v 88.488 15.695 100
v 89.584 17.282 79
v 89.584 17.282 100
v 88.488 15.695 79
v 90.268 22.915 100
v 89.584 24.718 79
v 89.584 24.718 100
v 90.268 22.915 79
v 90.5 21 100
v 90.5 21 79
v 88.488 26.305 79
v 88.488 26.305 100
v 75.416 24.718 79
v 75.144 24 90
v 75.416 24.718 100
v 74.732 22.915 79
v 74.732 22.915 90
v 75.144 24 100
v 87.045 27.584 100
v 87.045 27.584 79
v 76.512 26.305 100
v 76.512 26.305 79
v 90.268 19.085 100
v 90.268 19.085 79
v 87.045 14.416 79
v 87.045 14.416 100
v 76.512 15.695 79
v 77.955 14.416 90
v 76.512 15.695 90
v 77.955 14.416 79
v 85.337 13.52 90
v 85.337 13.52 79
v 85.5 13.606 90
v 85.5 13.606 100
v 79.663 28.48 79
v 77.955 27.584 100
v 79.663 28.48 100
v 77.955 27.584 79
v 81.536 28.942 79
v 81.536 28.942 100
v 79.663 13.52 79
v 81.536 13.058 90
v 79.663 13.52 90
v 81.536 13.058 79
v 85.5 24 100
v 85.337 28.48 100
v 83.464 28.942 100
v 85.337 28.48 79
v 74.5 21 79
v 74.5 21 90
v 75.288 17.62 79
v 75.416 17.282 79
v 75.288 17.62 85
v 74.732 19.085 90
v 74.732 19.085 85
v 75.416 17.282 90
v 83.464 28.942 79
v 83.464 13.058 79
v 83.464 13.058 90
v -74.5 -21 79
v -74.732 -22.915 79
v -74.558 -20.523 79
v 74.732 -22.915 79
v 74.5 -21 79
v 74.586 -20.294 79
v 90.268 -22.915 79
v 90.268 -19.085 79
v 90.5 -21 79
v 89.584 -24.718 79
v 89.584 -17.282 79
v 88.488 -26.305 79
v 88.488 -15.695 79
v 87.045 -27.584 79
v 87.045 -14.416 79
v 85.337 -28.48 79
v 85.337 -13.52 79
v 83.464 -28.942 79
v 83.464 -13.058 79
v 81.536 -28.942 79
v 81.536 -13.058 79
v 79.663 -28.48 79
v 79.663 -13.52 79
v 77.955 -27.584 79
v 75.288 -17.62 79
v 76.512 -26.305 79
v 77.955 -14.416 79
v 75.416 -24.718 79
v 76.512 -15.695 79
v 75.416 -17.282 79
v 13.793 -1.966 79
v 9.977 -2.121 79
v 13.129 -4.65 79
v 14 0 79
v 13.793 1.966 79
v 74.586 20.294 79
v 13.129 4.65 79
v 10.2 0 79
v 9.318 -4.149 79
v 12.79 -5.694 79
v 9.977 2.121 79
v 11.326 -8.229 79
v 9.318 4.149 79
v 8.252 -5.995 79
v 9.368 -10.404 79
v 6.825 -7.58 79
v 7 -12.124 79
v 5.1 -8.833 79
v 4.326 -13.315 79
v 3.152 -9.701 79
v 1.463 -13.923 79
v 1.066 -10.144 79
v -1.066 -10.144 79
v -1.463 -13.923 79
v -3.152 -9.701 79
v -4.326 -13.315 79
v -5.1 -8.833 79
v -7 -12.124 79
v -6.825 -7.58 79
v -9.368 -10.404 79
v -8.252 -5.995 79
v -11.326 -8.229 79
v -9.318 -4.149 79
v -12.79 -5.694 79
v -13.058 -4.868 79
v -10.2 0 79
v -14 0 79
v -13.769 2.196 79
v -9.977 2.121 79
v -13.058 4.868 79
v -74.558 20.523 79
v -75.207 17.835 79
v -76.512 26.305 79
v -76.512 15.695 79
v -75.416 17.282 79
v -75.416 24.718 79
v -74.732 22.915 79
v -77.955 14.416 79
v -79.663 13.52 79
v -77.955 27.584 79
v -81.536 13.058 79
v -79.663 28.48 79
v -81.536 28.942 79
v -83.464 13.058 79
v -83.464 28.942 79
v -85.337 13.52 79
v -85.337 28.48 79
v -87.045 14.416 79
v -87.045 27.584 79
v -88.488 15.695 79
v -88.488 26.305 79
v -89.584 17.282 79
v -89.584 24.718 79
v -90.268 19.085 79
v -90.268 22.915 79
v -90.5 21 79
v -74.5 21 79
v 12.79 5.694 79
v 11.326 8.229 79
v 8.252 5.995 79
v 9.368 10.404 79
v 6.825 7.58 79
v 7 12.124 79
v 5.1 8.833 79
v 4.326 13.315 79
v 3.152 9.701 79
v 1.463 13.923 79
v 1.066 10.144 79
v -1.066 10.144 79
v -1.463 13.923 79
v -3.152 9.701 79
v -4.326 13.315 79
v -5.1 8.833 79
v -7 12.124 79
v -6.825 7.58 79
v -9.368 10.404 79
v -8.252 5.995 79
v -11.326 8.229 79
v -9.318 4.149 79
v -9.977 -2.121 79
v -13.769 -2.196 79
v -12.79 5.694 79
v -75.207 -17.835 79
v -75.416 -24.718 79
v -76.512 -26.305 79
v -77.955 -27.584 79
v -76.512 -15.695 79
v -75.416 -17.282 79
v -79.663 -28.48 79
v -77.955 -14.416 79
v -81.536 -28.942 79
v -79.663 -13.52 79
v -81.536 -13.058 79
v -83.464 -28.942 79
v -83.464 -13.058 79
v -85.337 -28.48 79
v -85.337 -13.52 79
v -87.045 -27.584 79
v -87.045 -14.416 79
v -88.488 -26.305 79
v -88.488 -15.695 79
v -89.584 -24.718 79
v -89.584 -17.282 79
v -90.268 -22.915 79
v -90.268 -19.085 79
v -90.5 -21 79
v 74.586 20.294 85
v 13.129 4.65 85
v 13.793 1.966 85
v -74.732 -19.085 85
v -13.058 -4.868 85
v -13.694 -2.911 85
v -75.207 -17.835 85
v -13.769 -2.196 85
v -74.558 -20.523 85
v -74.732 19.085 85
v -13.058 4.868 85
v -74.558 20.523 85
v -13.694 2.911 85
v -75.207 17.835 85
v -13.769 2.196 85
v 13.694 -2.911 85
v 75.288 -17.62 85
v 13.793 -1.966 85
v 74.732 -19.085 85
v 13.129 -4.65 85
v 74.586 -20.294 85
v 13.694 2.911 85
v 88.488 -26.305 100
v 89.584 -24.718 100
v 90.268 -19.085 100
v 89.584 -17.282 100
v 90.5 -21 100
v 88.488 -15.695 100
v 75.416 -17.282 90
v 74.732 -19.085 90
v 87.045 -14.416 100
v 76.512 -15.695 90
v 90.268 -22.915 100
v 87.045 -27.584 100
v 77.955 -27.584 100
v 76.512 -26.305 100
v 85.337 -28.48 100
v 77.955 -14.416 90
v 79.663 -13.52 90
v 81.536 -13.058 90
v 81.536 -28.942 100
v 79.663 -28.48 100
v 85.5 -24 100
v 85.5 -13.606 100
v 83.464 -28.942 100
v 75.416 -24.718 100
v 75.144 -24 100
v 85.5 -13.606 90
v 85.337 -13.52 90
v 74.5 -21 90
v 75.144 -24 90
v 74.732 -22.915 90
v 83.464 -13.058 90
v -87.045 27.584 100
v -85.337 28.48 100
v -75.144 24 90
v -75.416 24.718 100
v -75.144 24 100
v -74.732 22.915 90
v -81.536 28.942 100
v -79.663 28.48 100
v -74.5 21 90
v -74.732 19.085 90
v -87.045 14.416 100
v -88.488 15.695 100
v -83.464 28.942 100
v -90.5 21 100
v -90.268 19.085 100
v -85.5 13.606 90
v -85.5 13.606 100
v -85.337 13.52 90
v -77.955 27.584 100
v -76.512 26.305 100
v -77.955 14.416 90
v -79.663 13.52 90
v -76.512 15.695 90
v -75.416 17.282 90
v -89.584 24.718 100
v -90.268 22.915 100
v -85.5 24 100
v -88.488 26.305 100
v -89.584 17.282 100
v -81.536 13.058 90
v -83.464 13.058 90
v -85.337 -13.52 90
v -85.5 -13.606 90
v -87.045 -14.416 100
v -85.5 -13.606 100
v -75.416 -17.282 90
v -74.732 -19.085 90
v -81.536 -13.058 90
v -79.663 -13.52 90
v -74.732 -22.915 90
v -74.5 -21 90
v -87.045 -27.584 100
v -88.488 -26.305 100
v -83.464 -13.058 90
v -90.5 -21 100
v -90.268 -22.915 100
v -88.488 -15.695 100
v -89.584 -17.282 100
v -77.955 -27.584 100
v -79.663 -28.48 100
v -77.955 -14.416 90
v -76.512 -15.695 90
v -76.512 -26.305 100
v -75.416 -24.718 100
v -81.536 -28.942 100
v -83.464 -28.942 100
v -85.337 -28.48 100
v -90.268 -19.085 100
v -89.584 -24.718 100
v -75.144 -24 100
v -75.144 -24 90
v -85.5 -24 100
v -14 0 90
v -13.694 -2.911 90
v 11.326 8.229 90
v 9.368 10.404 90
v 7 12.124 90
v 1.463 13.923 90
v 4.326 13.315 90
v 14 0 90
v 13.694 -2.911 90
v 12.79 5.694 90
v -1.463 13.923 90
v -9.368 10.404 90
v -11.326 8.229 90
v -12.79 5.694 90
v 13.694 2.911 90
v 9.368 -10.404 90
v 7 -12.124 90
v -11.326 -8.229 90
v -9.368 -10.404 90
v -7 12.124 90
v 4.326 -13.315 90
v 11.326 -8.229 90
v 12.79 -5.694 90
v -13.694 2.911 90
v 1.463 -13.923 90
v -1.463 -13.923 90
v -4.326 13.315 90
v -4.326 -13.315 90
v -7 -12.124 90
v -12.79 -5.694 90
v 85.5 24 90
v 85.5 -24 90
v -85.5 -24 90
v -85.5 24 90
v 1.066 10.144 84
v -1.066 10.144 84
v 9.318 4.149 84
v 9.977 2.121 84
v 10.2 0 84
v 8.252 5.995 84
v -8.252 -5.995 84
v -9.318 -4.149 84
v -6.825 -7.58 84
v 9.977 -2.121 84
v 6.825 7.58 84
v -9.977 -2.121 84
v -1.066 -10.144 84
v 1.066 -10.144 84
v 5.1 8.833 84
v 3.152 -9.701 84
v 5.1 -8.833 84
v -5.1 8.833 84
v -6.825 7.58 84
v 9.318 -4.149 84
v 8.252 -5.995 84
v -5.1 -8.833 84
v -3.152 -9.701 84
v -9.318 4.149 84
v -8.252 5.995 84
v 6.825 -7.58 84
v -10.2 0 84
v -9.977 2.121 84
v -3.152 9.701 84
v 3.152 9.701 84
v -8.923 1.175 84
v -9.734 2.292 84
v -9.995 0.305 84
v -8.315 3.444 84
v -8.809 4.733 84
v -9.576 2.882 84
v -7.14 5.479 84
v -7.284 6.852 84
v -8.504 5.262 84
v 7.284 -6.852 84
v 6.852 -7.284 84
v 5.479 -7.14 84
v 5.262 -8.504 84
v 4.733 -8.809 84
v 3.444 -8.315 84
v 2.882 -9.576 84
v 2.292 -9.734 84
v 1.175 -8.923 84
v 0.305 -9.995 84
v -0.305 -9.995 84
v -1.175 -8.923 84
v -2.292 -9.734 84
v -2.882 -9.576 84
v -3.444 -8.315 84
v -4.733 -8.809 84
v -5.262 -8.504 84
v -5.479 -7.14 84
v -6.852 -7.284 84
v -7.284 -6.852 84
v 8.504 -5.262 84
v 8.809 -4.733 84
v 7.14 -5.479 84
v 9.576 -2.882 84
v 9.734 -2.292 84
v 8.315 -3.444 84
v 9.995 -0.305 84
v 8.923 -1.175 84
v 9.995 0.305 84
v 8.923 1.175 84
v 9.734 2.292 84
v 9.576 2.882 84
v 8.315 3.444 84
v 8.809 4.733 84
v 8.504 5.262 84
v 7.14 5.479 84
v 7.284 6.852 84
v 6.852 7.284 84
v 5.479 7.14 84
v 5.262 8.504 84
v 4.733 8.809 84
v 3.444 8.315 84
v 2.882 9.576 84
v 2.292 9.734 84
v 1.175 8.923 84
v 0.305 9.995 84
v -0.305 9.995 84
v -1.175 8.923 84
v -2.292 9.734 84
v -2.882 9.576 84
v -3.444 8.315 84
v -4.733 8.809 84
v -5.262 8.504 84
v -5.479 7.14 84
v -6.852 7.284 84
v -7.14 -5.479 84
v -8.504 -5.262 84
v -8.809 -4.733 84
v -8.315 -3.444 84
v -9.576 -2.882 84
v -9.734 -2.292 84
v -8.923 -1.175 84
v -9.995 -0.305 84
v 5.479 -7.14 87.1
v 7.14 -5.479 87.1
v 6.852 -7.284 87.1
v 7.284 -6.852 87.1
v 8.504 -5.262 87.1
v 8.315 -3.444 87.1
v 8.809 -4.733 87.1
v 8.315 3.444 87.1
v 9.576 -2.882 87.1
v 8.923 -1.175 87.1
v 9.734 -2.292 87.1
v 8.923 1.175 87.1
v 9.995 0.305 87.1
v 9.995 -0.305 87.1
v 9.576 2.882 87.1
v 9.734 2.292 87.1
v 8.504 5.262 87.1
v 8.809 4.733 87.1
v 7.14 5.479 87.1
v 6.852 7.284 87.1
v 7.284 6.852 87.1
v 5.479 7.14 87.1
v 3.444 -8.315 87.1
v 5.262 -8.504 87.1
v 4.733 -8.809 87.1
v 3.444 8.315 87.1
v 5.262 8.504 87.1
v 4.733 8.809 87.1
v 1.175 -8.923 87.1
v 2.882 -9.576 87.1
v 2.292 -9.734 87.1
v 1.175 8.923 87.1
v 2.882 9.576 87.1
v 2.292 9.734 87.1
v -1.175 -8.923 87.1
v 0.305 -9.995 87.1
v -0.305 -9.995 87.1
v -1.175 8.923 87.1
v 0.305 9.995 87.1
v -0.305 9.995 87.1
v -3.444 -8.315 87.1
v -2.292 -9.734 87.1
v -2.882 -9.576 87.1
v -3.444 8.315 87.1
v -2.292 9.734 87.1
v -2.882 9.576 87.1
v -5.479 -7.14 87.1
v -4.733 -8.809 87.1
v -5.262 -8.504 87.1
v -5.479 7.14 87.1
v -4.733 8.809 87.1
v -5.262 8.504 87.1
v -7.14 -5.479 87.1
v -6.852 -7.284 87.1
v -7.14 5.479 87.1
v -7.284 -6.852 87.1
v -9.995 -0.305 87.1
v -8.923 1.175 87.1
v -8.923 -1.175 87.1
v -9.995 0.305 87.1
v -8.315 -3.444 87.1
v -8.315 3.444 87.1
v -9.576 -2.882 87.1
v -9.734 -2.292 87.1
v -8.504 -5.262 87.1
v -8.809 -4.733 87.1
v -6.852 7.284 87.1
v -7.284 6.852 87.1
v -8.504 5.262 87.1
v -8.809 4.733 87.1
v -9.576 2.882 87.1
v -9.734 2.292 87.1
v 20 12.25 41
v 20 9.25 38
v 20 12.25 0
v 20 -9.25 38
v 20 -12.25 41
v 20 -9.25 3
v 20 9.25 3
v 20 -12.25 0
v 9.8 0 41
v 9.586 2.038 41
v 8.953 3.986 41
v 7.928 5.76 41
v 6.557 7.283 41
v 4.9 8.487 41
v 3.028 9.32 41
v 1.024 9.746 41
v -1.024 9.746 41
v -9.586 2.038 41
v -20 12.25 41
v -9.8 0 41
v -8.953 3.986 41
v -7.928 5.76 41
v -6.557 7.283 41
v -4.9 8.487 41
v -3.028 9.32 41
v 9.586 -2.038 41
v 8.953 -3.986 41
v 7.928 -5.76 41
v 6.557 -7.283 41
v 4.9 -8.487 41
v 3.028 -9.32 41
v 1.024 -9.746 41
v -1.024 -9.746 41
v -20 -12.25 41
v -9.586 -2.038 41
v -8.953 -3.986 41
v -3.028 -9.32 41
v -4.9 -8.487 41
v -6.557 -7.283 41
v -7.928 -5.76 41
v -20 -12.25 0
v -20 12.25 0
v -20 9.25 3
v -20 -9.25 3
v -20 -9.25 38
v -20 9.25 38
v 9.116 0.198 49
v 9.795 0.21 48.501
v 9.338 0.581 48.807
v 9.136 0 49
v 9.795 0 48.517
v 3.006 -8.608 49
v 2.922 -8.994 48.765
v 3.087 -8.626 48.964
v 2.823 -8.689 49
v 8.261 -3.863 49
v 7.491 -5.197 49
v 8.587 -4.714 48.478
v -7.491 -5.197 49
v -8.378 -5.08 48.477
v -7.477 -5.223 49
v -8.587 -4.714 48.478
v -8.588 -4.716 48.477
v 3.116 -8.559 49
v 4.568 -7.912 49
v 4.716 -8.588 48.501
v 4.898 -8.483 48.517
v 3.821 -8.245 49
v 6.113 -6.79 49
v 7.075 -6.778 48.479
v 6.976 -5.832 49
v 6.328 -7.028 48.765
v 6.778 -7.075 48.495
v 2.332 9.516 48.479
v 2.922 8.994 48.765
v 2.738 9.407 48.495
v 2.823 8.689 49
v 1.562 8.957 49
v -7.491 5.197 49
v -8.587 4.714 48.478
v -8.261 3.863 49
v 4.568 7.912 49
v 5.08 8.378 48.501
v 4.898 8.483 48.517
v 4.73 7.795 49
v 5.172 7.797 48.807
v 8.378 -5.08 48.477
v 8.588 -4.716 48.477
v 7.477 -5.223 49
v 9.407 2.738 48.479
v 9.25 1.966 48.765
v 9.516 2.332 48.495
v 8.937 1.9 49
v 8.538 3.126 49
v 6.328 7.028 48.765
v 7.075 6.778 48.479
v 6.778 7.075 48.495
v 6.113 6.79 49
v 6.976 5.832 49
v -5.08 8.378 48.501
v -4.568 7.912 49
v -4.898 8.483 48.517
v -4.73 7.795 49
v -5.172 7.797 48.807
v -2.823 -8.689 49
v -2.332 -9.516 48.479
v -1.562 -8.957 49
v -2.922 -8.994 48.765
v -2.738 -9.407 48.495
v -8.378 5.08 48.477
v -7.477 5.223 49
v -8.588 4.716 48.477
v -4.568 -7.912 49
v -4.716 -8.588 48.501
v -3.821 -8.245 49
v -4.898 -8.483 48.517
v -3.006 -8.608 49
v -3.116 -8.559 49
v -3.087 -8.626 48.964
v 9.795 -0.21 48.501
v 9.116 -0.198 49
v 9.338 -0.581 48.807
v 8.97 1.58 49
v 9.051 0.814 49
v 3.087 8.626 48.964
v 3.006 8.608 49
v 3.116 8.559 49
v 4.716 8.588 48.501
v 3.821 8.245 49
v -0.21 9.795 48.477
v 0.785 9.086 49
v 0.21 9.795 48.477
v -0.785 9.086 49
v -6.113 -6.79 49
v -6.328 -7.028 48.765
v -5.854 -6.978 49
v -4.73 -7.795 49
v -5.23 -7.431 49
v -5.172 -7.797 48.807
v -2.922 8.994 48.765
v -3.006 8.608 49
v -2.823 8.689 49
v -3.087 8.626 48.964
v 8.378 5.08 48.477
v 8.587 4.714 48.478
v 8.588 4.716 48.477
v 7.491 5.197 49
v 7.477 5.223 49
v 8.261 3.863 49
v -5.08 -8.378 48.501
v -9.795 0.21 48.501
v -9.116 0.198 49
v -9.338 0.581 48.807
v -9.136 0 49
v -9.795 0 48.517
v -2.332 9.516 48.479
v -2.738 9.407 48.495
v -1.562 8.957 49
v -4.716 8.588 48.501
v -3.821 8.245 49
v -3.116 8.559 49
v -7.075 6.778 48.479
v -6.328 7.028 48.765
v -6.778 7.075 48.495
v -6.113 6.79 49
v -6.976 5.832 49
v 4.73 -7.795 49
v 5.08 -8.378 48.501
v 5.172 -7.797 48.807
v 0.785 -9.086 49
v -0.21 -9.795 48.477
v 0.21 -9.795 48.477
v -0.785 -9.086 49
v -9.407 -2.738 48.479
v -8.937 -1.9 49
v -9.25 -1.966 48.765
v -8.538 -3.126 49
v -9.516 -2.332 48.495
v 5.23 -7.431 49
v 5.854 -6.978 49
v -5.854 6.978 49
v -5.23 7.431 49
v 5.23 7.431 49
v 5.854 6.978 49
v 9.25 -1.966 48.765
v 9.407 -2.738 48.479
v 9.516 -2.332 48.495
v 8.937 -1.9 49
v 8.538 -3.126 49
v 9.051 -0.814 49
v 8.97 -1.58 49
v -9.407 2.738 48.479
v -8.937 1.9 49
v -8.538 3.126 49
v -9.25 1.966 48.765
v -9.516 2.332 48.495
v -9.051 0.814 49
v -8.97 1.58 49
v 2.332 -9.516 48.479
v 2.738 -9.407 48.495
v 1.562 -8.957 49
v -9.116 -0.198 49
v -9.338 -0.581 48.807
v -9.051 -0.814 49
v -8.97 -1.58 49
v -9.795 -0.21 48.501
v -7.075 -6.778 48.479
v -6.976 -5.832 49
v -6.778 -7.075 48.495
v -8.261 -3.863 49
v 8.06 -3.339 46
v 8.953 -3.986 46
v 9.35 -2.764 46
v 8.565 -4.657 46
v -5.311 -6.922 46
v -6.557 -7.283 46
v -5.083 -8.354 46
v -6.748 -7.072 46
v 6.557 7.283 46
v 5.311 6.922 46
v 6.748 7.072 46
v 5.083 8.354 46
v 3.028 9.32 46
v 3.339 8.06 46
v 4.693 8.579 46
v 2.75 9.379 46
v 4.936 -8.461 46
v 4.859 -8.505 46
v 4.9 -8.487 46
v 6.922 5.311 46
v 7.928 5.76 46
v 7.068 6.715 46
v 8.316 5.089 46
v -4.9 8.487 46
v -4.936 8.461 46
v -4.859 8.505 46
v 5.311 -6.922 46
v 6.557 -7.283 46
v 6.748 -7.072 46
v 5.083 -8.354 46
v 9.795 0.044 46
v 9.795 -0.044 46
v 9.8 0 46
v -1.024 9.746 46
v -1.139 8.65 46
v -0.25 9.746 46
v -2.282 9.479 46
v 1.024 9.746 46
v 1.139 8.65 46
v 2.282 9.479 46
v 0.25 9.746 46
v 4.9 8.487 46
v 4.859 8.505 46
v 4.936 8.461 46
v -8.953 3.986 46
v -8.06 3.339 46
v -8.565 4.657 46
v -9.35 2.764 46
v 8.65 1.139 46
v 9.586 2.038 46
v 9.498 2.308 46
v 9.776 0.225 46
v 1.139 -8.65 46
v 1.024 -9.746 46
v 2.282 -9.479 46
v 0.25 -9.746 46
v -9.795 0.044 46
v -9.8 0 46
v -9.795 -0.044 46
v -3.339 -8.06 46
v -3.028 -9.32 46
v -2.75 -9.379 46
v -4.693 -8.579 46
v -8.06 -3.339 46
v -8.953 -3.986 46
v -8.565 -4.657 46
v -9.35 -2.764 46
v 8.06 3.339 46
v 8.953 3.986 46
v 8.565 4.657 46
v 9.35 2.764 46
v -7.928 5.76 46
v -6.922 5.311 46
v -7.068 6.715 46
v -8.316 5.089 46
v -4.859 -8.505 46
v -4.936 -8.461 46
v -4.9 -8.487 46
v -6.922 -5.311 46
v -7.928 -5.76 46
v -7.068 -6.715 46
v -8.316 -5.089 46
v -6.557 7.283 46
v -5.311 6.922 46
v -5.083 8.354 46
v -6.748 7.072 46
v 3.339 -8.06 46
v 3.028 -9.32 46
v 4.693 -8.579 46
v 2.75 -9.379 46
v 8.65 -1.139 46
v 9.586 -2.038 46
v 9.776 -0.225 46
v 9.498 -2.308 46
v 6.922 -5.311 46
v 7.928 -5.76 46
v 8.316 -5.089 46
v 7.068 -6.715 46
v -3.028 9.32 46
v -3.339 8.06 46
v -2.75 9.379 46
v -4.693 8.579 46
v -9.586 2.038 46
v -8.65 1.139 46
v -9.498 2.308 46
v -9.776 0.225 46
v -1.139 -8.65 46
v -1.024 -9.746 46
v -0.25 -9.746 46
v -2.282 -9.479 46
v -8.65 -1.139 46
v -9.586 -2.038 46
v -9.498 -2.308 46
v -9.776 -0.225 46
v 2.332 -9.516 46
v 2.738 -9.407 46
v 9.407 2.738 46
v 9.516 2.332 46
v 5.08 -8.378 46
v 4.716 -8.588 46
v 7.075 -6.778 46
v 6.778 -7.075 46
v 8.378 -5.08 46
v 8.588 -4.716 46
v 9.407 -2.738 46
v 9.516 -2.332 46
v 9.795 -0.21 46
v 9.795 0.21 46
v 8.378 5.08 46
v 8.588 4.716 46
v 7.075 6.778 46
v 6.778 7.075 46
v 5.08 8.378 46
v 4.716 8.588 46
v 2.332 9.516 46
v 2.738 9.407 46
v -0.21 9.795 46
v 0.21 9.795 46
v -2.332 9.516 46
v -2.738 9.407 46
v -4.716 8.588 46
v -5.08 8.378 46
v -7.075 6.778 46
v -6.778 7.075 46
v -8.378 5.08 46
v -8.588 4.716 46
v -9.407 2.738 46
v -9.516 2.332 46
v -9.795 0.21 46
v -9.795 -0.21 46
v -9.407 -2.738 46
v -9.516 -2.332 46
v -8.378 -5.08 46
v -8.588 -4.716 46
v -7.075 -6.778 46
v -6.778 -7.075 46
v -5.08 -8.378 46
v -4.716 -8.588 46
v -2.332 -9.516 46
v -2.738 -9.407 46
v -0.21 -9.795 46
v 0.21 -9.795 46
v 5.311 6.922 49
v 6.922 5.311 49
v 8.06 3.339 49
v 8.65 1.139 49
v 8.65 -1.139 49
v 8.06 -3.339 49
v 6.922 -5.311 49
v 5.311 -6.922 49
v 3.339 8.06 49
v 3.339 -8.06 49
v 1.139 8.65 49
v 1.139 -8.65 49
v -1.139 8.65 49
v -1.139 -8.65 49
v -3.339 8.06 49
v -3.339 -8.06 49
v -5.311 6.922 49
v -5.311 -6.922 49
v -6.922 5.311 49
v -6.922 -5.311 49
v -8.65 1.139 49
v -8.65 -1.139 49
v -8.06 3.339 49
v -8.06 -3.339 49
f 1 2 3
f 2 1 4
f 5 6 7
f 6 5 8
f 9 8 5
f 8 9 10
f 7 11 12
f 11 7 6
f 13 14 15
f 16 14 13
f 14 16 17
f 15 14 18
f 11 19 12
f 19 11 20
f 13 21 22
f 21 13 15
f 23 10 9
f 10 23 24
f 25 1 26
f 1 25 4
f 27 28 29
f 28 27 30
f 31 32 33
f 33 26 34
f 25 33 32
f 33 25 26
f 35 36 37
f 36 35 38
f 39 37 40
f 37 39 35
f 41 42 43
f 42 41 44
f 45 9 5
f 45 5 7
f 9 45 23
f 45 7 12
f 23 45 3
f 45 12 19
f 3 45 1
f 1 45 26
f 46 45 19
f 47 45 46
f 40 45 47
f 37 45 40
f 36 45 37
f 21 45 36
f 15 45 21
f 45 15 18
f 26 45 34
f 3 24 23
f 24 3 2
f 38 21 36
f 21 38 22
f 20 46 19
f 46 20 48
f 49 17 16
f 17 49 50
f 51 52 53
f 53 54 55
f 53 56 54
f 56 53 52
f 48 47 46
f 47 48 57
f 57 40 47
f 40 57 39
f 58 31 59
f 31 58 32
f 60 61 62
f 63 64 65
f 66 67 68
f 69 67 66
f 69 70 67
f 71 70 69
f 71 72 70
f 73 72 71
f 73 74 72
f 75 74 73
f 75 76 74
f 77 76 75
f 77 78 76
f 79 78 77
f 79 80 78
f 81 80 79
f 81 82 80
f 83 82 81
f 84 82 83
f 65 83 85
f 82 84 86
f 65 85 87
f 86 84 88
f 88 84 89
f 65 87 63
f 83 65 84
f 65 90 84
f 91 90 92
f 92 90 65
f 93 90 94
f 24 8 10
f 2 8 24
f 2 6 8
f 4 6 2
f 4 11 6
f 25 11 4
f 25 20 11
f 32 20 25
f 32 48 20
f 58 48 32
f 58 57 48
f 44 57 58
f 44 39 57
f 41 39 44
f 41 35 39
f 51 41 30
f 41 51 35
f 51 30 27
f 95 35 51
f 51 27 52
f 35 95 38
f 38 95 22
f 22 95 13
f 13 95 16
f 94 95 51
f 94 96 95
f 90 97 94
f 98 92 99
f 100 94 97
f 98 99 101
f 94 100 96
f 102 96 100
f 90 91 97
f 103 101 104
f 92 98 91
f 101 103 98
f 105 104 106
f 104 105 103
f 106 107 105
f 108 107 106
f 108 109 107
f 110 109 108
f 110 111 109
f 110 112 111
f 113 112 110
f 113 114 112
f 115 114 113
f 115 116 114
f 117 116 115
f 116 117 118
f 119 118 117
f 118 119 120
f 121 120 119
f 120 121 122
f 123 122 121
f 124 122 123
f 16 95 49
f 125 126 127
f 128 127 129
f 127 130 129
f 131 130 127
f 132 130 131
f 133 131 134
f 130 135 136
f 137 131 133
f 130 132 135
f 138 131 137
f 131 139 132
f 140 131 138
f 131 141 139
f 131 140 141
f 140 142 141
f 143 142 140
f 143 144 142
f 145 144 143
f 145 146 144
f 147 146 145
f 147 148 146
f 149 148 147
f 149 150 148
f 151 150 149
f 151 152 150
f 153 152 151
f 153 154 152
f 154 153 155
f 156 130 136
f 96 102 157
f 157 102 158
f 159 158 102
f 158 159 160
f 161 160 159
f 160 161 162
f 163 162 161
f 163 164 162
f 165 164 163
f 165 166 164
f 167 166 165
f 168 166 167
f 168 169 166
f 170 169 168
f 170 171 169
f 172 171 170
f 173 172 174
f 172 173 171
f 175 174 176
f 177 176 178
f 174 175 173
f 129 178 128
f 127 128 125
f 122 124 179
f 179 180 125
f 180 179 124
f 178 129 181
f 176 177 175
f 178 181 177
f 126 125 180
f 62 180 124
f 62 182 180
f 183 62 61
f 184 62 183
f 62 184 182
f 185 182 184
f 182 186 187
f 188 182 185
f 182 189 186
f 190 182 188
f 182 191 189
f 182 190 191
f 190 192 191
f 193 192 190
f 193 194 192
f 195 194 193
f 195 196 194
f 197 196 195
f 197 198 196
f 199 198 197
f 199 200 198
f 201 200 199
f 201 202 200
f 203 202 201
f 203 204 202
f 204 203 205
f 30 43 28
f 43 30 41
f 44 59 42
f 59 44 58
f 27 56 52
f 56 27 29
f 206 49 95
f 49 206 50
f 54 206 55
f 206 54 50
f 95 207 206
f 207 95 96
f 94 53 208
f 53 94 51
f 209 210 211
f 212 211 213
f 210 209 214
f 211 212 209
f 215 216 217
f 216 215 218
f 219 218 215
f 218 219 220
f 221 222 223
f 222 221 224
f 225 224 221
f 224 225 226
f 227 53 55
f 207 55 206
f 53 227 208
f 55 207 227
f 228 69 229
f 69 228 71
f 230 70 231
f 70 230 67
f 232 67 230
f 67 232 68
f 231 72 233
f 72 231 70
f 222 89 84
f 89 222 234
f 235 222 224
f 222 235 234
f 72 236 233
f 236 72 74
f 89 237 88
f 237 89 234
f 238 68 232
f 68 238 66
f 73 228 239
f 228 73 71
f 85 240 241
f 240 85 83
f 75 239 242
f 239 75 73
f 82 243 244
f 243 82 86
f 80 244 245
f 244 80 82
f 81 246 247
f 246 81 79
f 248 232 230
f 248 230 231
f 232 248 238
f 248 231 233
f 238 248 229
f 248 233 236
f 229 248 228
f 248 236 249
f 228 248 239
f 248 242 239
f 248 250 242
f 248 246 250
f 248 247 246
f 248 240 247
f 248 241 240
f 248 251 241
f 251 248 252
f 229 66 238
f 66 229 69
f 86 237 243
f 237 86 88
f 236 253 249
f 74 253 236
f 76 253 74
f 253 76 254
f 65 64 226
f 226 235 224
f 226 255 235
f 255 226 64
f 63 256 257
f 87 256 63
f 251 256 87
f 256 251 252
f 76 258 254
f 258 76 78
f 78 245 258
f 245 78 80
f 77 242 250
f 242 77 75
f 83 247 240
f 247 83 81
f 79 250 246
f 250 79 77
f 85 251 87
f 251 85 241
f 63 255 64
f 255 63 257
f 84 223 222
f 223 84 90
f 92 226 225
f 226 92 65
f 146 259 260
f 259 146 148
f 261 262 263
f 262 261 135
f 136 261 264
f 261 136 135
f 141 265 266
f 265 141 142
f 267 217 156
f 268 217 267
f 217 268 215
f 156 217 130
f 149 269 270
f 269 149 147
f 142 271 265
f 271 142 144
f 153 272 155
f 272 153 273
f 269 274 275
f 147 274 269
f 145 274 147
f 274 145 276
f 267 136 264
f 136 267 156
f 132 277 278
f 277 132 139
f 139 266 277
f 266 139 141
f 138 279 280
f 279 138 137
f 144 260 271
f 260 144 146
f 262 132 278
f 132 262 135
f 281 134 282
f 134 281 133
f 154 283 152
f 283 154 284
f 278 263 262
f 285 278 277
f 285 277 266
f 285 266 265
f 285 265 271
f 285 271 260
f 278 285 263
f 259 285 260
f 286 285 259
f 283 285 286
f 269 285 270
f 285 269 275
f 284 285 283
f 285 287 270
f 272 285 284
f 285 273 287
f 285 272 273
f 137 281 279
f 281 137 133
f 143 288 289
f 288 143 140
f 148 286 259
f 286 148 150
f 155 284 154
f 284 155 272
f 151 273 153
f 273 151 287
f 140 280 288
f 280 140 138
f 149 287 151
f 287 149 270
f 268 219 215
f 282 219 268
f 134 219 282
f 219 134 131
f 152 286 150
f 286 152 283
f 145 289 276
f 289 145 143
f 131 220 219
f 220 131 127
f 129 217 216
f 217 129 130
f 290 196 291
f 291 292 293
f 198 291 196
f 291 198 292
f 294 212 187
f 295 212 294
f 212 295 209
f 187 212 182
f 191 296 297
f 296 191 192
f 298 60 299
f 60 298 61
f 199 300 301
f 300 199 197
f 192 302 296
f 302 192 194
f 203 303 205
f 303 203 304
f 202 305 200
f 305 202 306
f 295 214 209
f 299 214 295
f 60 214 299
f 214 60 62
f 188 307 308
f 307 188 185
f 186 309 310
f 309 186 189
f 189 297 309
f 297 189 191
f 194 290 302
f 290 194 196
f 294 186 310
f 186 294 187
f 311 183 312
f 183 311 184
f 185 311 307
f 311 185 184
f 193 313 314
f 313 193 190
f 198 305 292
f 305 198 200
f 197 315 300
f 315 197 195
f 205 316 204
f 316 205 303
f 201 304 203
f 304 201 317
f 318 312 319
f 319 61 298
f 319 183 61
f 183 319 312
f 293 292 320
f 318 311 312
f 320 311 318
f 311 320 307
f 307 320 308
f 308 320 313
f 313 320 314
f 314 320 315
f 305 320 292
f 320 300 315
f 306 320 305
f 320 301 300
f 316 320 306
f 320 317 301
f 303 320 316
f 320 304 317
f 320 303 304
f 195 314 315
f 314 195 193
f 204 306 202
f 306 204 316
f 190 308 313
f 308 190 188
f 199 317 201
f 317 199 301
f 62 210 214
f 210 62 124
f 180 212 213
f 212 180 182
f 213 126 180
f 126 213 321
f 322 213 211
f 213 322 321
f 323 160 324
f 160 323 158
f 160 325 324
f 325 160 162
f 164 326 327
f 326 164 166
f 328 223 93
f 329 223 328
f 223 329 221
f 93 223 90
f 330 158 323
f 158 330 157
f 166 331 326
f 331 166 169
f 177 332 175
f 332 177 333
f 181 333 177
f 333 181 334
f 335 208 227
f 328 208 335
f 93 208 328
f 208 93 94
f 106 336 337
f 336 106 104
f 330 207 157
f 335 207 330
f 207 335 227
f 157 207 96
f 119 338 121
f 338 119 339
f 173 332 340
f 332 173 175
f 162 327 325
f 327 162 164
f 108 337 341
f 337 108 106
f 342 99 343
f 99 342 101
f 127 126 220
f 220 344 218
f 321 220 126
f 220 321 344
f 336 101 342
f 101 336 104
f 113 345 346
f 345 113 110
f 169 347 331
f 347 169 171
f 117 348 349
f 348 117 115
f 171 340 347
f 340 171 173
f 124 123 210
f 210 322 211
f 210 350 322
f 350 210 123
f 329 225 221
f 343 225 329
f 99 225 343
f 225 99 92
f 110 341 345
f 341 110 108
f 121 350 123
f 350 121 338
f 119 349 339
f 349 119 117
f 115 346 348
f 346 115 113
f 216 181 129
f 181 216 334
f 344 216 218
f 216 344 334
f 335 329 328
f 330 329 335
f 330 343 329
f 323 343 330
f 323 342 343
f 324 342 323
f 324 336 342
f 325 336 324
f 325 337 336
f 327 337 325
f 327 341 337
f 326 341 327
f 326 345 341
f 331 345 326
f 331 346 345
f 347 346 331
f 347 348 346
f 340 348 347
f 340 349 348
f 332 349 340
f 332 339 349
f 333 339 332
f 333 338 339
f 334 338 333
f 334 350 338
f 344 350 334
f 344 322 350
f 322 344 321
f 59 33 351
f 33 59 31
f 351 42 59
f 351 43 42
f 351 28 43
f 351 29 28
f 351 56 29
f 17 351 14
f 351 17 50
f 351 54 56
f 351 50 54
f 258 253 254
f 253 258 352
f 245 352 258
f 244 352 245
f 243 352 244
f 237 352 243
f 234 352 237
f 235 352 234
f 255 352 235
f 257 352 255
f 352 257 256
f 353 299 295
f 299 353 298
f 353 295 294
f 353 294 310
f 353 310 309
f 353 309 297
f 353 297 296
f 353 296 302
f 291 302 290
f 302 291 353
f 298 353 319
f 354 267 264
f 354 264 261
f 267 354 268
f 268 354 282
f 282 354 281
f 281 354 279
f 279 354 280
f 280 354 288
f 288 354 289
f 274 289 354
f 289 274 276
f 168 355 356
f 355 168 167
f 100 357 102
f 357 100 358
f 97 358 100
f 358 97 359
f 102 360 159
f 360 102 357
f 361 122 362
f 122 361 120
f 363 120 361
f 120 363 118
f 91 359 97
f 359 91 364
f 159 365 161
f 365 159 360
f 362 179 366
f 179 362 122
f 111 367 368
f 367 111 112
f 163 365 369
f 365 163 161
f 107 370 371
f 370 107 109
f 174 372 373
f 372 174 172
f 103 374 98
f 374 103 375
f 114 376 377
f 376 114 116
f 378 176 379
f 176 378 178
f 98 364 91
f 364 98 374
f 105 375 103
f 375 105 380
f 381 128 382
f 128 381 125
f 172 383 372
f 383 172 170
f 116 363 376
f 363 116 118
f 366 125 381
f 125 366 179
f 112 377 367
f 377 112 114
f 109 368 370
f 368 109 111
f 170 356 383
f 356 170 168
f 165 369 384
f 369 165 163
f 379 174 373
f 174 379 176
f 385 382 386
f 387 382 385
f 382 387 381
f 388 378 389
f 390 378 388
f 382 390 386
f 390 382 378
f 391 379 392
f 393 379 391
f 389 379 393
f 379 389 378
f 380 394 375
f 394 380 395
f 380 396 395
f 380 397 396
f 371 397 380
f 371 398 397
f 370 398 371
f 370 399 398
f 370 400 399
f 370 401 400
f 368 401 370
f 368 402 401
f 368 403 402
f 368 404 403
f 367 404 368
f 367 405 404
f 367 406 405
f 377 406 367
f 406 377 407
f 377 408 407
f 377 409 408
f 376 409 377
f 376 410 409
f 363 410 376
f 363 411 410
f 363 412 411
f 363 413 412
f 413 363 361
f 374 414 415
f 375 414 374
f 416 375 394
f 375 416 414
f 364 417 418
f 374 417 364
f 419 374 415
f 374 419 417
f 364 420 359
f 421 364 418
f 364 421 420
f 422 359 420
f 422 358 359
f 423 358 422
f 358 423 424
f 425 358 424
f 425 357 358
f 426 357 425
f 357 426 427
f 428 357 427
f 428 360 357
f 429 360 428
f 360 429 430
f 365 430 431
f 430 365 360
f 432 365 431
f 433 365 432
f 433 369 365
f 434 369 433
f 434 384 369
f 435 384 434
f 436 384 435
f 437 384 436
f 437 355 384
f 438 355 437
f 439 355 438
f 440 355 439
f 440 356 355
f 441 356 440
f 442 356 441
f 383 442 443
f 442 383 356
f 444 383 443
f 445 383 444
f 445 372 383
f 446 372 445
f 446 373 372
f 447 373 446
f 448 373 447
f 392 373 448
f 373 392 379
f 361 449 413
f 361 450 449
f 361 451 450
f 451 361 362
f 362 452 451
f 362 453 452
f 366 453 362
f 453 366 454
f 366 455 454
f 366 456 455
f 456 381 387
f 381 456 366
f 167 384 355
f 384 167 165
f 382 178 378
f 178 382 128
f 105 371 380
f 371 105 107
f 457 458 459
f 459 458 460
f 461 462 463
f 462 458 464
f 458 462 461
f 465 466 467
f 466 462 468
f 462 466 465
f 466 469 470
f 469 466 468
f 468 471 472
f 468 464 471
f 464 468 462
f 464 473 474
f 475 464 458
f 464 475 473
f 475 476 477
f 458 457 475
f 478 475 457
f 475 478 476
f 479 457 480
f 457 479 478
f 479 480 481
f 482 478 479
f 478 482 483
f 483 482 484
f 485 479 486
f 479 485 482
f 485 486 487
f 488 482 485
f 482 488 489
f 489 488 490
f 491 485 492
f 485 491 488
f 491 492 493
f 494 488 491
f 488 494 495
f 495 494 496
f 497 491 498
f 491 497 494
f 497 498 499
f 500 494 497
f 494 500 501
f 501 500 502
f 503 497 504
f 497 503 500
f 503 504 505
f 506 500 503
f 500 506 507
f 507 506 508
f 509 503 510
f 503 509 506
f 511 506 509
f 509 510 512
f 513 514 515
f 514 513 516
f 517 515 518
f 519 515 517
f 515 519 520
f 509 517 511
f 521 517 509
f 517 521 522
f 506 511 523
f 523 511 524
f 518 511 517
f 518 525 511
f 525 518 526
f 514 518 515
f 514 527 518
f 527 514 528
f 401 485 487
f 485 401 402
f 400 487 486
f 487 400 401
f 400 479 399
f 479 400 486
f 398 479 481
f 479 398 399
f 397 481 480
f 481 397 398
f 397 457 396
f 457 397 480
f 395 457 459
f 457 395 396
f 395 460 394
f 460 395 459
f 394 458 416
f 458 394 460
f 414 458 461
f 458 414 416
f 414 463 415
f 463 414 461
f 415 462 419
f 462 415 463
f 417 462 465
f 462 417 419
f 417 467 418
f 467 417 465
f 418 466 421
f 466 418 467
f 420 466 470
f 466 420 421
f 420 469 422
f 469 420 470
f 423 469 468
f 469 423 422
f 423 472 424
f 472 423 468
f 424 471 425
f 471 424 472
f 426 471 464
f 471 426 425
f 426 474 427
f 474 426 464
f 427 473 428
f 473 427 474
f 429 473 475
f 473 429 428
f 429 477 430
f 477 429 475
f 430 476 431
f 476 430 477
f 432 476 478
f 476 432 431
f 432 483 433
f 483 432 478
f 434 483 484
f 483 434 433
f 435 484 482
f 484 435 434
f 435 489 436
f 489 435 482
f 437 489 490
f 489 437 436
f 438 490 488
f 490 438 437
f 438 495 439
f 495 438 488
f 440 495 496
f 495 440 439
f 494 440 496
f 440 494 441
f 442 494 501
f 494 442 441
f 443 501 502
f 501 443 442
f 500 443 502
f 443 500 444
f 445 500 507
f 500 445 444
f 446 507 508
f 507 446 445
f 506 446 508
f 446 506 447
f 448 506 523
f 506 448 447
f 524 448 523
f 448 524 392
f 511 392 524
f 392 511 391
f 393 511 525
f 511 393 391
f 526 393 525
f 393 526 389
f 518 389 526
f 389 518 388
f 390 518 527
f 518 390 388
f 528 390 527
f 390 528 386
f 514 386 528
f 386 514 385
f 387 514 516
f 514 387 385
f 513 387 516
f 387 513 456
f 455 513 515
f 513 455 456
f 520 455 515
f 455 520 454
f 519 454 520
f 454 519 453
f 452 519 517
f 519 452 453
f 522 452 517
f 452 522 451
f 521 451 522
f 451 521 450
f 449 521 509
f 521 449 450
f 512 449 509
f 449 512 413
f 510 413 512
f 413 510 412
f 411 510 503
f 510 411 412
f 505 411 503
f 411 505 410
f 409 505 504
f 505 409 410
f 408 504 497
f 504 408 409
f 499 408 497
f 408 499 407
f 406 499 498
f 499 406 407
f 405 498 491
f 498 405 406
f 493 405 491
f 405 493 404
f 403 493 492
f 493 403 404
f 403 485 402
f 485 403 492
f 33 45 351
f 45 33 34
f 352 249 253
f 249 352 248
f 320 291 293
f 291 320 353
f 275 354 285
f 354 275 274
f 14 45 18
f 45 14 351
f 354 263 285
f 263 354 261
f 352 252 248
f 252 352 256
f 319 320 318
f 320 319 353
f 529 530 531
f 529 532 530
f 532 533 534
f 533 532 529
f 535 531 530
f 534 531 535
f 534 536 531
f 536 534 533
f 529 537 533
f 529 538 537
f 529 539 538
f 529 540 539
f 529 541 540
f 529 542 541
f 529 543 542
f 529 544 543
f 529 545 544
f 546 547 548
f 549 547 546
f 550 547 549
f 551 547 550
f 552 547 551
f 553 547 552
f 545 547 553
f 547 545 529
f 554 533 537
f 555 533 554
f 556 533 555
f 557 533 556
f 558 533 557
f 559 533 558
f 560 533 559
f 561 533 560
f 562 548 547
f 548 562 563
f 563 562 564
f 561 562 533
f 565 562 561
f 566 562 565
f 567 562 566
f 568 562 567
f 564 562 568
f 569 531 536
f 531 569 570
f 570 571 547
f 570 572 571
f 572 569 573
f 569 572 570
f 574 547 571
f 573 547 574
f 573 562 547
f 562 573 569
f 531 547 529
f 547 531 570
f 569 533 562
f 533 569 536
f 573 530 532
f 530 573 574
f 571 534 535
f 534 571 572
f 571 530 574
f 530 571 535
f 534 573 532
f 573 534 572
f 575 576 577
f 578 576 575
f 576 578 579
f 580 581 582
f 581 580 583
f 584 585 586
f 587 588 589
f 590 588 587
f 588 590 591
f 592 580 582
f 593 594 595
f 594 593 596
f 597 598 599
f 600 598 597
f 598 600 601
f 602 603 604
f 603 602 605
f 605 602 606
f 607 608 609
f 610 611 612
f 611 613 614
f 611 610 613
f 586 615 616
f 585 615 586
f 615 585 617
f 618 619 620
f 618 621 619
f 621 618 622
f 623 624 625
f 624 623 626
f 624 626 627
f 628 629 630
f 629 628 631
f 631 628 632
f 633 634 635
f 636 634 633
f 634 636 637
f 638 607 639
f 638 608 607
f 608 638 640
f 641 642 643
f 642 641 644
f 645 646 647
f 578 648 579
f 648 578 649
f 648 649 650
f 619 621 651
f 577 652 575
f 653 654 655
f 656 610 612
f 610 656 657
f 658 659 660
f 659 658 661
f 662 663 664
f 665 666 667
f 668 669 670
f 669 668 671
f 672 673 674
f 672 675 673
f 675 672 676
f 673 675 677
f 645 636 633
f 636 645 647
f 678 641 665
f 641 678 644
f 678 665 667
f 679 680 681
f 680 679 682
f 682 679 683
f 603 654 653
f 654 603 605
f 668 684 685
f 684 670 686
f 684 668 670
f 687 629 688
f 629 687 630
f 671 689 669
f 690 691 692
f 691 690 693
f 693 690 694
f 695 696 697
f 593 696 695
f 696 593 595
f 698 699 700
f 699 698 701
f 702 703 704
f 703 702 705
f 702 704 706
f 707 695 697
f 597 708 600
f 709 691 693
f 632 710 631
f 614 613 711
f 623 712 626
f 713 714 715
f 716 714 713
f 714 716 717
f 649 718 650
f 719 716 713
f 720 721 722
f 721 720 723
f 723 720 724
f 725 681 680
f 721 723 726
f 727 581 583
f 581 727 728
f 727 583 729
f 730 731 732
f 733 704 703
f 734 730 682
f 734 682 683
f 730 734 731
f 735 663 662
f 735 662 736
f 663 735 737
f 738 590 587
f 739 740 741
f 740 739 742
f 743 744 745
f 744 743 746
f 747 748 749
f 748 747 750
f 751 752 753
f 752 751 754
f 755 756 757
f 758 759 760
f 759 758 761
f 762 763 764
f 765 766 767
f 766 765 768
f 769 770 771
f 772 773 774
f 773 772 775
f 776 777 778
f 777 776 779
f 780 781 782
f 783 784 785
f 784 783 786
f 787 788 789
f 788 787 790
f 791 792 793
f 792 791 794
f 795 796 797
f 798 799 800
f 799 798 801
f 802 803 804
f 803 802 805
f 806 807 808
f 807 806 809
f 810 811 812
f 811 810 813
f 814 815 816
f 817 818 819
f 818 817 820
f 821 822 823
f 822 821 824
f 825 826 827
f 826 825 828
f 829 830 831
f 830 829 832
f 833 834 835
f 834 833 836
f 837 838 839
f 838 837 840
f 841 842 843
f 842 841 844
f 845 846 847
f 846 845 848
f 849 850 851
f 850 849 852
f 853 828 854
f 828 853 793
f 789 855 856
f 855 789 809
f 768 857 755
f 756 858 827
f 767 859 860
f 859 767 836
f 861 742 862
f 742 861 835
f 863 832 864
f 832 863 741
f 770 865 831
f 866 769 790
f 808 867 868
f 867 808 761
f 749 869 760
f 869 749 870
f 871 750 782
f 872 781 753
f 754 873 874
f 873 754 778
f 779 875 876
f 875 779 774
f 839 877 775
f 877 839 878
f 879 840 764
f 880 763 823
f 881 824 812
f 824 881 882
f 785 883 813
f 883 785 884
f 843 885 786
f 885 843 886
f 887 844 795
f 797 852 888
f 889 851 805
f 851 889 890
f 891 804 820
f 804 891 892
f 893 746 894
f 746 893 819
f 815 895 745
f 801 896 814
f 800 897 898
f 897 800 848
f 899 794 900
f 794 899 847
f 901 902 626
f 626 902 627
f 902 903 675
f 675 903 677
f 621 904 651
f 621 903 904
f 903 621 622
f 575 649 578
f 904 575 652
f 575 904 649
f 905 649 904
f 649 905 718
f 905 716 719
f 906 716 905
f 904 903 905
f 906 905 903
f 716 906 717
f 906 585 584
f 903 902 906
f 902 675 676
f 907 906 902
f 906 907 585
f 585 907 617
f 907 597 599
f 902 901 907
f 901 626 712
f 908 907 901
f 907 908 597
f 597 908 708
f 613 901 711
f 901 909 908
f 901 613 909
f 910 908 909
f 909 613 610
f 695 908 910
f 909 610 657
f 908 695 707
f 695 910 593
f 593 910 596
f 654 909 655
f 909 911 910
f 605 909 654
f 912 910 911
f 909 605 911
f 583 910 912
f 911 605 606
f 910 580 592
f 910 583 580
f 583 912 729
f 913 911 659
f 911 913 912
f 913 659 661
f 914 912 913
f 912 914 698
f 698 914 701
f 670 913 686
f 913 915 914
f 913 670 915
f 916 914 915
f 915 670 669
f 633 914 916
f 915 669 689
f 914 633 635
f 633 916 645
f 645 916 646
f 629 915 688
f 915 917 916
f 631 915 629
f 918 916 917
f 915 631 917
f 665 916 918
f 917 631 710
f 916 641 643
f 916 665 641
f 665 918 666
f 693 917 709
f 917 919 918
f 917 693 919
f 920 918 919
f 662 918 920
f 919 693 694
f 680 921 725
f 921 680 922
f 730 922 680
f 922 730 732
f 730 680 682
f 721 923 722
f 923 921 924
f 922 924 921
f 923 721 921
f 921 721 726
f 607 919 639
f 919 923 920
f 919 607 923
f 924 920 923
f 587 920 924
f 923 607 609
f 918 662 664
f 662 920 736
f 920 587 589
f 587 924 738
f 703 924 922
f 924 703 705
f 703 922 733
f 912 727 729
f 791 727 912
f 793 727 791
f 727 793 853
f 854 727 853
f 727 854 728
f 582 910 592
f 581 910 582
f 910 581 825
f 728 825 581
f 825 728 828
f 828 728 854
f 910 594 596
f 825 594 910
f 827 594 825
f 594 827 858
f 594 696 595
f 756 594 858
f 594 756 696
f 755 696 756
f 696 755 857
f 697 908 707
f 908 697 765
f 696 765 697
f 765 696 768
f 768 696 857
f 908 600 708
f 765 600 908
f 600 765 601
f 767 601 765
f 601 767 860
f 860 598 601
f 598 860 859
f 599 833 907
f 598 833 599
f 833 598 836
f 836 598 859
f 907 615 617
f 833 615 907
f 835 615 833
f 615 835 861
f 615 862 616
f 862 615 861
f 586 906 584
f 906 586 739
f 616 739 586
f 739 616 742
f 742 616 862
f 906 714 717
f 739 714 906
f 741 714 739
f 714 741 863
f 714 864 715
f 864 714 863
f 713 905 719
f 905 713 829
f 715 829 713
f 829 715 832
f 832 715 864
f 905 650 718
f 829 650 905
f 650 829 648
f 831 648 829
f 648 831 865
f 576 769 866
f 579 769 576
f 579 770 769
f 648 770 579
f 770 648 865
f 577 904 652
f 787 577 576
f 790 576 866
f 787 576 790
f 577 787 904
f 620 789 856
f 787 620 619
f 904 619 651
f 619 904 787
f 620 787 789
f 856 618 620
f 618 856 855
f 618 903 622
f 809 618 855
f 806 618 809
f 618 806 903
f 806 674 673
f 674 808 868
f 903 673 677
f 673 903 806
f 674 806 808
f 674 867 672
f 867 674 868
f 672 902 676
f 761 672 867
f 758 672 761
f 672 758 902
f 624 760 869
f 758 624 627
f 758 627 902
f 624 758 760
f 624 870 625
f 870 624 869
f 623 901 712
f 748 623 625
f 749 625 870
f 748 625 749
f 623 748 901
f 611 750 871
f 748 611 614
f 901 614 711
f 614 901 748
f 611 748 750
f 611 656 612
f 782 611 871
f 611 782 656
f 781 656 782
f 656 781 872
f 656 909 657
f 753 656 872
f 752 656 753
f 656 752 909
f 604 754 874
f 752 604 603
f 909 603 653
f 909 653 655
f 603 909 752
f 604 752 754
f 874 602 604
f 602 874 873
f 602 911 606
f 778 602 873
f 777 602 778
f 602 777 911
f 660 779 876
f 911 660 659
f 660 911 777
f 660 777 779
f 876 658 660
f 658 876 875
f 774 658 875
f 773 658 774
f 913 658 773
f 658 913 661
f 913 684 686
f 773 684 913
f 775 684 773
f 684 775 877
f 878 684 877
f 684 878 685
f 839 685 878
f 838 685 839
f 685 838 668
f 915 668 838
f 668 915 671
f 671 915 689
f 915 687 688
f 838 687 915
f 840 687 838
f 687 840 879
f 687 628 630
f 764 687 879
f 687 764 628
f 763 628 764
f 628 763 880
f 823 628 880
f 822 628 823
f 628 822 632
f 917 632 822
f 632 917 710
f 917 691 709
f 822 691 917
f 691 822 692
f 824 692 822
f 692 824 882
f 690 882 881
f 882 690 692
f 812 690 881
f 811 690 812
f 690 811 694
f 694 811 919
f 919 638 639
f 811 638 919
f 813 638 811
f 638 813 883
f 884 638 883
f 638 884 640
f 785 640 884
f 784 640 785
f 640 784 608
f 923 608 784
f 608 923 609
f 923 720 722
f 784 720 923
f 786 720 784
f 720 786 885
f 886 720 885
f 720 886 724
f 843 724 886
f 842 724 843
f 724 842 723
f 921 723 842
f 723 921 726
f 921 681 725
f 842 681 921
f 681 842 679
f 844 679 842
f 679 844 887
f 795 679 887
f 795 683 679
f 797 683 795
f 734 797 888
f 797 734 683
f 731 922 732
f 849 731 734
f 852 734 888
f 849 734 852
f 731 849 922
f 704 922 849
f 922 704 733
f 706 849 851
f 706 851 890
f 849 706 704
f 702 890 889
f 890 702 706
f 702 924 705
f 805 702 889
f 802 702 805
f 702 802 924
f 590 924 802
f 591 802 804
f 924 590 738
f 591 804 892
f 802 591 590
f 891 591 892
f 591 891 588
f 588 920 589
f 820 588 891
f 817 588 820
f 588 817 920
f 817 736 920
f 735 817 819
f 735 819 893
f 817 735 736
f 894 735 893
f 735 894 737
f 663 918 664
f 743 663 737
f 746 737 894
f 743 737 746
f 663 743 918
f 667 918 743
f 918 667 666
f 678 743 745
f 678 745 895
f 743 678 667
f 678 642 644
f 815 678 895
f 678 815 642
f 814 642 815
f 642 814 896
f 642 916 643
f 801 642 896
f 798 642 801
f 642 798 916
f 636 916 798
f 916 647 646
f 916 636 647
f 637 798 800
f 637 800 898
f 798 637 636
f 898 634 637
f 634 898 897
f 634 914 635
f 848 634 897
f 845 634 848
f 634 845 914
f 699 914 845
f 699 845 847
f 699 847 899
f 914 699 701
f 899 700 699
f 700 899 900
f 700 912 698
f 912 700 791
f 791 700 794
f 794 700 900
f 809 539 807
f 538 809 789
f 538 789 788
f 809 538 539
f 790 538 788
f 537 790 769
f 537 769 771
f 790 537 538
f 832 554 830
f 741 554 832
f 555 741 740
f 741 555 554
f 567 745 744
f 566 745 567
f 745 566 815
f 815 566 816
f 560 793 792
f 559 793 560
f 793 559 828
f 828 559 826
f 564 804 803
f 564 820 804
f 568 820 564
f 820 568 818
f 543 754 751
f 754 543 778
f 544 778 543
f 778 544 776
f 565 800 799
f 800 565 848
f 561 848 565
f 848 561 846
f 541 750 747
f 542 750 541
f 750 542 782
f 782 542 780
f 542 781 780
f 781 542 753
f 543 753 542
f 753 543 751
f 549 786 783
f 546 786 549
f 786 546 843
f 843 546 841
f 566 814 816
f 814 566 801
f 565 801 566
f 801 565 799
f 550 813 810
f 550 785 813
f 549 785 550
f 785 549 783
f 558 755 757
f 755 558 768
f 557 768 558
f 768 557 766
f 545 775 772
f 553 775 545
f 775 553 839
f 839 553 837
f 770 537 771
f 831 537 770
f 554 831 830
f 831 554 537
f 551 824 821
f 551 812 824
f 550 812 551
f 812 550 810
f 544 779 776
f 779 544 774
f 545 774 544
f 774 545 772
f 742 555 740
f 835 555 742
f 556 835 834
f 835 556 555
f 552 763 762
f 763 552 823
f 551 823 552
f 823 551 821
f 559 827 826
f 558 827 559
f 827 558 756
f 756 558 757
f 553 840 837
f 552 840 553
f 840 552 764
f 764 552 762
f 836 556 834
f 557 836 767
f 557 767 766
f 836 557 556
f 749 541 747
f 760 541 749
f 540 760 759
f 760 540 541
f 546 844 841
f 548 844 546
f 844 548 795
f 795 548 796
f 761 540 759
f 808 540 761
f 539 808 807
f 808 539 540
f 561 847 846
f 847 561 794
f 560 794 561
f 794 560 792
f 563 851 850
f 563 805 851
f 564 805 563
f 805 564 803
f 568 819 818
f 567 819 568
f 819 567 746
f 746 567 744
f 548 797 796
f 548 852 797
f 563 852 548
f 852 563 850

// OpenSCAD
// file: ../../libs/BOSL2/BOSL2/std.scad
// Minimal BOSL2 compatibility shim for bundled gallery models.
// It implements only the helpers used by the imported OpenSCAD projects.

CENTER = [0, 0, 0];
BOTTOM = [0, 0, -1];
TOP = [0, 0, 1];
LEFT = [-1, 0, 0];
RIGHT = [1, 0, 0];
FRONT = [0, -1, 0];
BACK = [0, 1, 0];

module up(z=0) {
    translate([0, 0, z]) children();
}

module down(z=0) {
    translate([0, 0, -z]) children();
}

module attach(anchor=CENTER) {
    children();
}

module cuboid(size=[1, 1, 1], anchor=CENTER) {
    center = anchor == CENTER;
    translate(center ? [0, 0, 0] : [0, 0, size[2] / 2])
        cube(size, center=true);
    children();
}

module xcyl(h=1, r=1, anchor=CENTER) {
    center = anchor == CENTER;
    translate(center ? [0, 0, 0] : [h / 2, 0, 0])
        rotate([0, 90, 0])
            cylinder(h=h, r=r, center=true);
}
// file: ../../libs/BOSL2/std.scad
include <BOSL2/std.scad>

module rot_copy(n){
    dtheta = 360/n;
    for(theta=[0:dtheta:359.99])
        rotate([0,0,theta])
        children();
}
module translate_(x,y,z){
    translate([x,y,z])
        children();
}
module rotate_(x,y,z){
    rotate([x,y,z])
        children();
}
// main file
// スピーカースタンド (Anker SoundCore Motion B用)
include <../../libs/BOSL2/std.scad>

// スピーカーの寸法 (Anker SoundCore Motion B: 約171 x 56 x 48)
speaker_width = 171.0;
speaker_depth = 48.0;
speaker_corner_r = 3.0; // 角の丸み
wall_thick = 2.0;       // 最低限の壁厚
corner_support_size = 15; // 四角を支える爪の一辺の長さ
corner_support_height = 10; // 爪の高さ

// デスクマウント部 (縦35mm x 奥行き18.5mmの角材にスライド)
desk_bar_height = 35.0; // 縦方向
desk_bar_depth = 18.5;  // 奥行き方向
mount_thick = 3.0; // マウント部壁厚
mount_length = 40.0; // スライド方向(幅)の長さ

// 15度単位の回転ジョイント (360 / 15 = 24)
joint_teeth = 24;
joint_radius = 10.0; // マウント部の角の丸め(R2)を考慮し、平坦部(20.5mm)に収まるように半径を10.0mm(直径20mm)に縮小
joint_height = 3; // ギア部分の高さ（3mm）
joint_base_h = 5.0; // ジョイント根本のギアなし円柱部分の高さ
clearance = 0.2; // 調整用クリアランス

// スタンド本体の基本の厚み (ジョイント穴が開かないようにしっかり厚みを持たせる)
base_thick = 10.0; 

// スタンド本体中央の厚みを確保（ジョイントの凹み用）
base_center_thick = max(base_thick, joint_height + 2.0);

// 星形（ギア状）の深い切り込みを持つジョイント形状を生成するモジュール
module joint_shape(r, h, clr=0) {
    // ギアの切り込み深さを 1.0mm に浅くする
    core_radius = r - 1.0; 
    
    // 各歯のピッチ角度 (360 / 24 = 15度)
    P_angle = 360 / joint_teeth; 
    
    // 山の頂点（外側）は少し平ら（平坦）な部分を残し、谷（凹み）は鋭い三角形になるようにする
    top_flat_angle = 3.5; // 少し浅くなった分、山の平らな部分の角度幅をわずかに広げる (3.5度)
    
    linear_extrude(height=h) {
        offset(delta = -clr) {
            polygon(points=[
                for(i = [0 : joint_teeth - 1])
                let(
                    theta = i * P_angle,
                    theta_next_valley = theta + (P_angle / 2), // 次の谷の中心角度
                    t_half = top_flat_angle / 2
                )
                for(pt = [
                    [ r * cos(theta - t_half), r * sin(theta - t_half) ], // 山の平らな部分の開始点
                    [ r * cos(theta + t_half), r * sin(theta + t_half) ], // 山の平らな部分の終了点
                    [ core_radius * cos(theta_next_valley), core_radius * sin(theta_next_valley) ] // 谷の底（1点）
                ]) pt
            ]);
        }
    }
}

// スピーカーベースプレート（上部）
module speaker_base_plate() {
    center_r = joint_radius + 4.0; // 中央の円柱の半径
    corner_r = 8.0; // 四隅の円柱の半径（スピーカーをしっかりホールドできるよう少し太く戻す）
    
    // 高さを個別に制御
    center_h = joint_height + joint_base_h + 3.0; // ジョイントが刺さるため、必要な厚みを確保 (ギア分 + 円柱延長分 + 底厚み)
    beam_h = 6.0; // 縦の曲げに強くするため高さを出す（板状）
    beam_w = 3.0; // 梁の厚みは薄くする
    
    // コーナーの円柱の配置位置（スピーカーの角の丸みに同心に合わせる）
    xc = (speaker_width/2) - speaker_corner_r; 
    yc = (speaker_depth/2) - speaker_corner_r;

    difference() {
        union() {
            // 中央の円柱 (ジョイント受け用)
            cylinder(r=center_r, h=center_h, anchor=BOTTOM);
            
            // 四隅の円柱と、中央をつなぐ梁 (X型・薄い)
            for(x = [xc, -xc]) {
                for(y = [yc, -yc]) {
                    // 四隅の支え円柱 (下側に伸ばし、底面を中央の円柱と同じZ=0に揃える)
                    translate([x, y, 0]) {
                        cylinder(r=corner_r, h=center_h + corner_support_height, anchor=BOTTOM);
                    }
                    
                    // 中央から四隅の爪の中心へのストレートな梁 (底面 Z=0 に合わせる)
                    hull() {
                        cylinder(r=beam_w/2, h=beam_h, anchor=BOTTOM);
                        translate([x, y, 0]) {
                            cylinder(r=beam_w/2, h=beam_h, anchor=BOTTOM);
                        }
                    }
                }
            }
        }
        
        // 四隅の支えだけ残し、スピーカーが収まるメイン空間をくり抜く
        // スピーカーは「center_h(6mm)」の高さに乗るため、center_h以上の空間をくり抜く
        translate([0, 0, center_h]) {
            cuboid([speaker_width, speaker_depth, corner_support_height+1], rounding=speaker_corner_r, edges="Z", anchor=BOTTOM);
        }
        
        // 回転ジョイント（メス：スタンド側）
        // 底面(Z=0)から直接上に向かって彫る
        translate([0, 0, -0.1]) {
            // まずギアなしの円柱の穴を開ける（5mm深さ＋クリアランス余白）
            cylinder(r=joint_radius + clearance, h=joint_base_h + 0.1, anchor=BOTTOM);
            // その奥にオス側が刺さるための星形（ギア状）の穴を開ける
            translate([0, 0, joint_base_h]) {
                joint_shape(joint_radius, joint_height + 0.2, 0); // メス側（穴）は基準サイズ
            }
        }
    }
}

// デスクマウント（下部）
module desk_mount() {
    union() {
        difference() {
            // マウント部外形 (X: スライド方向, Y: 奥行き, Z: 縦)
            cuboid([mount_length, desk_bar_depth + mount_thick*2, desk_bar_height + mount_thick*2], anchor=BOTTOM, rounding=2);
            
            // デスク角材の貫通穴 (X方向にスライドイン)
            translate([0, 0, mount_thick]) {
                cuboid([mount_length+1, desk_bar_depth, desk_bar_height], anchor=BOTTOM);
            }
            
            // スライドインできるように底面側などを開く（コの字型にするなら以下を追加）
            /*
            translate([0, (desk_bar_depth/2) + mount_thick, mount_thick + (desk_bar_height/2)]) {
                cuboid([mount_length+1, mount_thick*2, desk_bar_height], anchor=CENTER);
            }
            */
        }
        
        // 回転ジョイント（オス）
        translate([0, 0, desk_bar_height + mount_thick*2]) {
            // 根本のギアなしの円柱部分 (5mm)
            cylinder(r=joint_radius - clearance, h=joint_base_h, anchor=BOTTOM);
            
            // その上にギア部分を乗せる
            translate([0, 0, joint_base_h]) {
                // difference で直接角のエッジを削り取る方法に変更（確実に透けないようにする）
                difference() {
                    // オス側のギア形状 (高さは交差で切るので少し長めに出しておく)
                    joint_shape(joint_radius, joint_height, clearance);
                    
                    // オス側の先端の角（ふち）を削り取って面取りするためのドーナツ状のくさび
                    // Z軸の一番上に配置し、外側から内側斜めに向かって削る
                    translate([0, 0, joint_height - 1.0]) {
                        difference() {
                            // 削り取る範囲（ジョイントより一回り大きい円柱）
                            cylinder(r=joint_radius + 2, h=1.0 + 0.1, anchor=BOTTOM);
                            // 残す部分（下に向かって広がる円錐台）
                            // r1(下)は削らないように大きく、r2(上)に向かって小さくしていく
                            cylinder(r1=joint_radius + 0.5, r2=joint_radius - 1.0, h=1.0 + 0.1, anchor=BOTTOM);
                        }
                    }
                }
            }
        }
    }
}

// 組み立て（プレビュー用）
module assembly() {
    color("lightblue") {
        // 接合部の構造が見えるように上方に隙間を空けてプレビューします (+ 30)
        translate([0, 0, desk_bar_height + mount_thick*2 + joint_base_h + joint_height + 30]) {
            speaker_base_plate();
        }
    }
    color("darkgray") {
        desk_mount();
    }
}

// パーツ別出力 (いずれかのコメントを外して個別にSTL出力する)

assembly();
// speaker_base_plate();
// desk_mount();
